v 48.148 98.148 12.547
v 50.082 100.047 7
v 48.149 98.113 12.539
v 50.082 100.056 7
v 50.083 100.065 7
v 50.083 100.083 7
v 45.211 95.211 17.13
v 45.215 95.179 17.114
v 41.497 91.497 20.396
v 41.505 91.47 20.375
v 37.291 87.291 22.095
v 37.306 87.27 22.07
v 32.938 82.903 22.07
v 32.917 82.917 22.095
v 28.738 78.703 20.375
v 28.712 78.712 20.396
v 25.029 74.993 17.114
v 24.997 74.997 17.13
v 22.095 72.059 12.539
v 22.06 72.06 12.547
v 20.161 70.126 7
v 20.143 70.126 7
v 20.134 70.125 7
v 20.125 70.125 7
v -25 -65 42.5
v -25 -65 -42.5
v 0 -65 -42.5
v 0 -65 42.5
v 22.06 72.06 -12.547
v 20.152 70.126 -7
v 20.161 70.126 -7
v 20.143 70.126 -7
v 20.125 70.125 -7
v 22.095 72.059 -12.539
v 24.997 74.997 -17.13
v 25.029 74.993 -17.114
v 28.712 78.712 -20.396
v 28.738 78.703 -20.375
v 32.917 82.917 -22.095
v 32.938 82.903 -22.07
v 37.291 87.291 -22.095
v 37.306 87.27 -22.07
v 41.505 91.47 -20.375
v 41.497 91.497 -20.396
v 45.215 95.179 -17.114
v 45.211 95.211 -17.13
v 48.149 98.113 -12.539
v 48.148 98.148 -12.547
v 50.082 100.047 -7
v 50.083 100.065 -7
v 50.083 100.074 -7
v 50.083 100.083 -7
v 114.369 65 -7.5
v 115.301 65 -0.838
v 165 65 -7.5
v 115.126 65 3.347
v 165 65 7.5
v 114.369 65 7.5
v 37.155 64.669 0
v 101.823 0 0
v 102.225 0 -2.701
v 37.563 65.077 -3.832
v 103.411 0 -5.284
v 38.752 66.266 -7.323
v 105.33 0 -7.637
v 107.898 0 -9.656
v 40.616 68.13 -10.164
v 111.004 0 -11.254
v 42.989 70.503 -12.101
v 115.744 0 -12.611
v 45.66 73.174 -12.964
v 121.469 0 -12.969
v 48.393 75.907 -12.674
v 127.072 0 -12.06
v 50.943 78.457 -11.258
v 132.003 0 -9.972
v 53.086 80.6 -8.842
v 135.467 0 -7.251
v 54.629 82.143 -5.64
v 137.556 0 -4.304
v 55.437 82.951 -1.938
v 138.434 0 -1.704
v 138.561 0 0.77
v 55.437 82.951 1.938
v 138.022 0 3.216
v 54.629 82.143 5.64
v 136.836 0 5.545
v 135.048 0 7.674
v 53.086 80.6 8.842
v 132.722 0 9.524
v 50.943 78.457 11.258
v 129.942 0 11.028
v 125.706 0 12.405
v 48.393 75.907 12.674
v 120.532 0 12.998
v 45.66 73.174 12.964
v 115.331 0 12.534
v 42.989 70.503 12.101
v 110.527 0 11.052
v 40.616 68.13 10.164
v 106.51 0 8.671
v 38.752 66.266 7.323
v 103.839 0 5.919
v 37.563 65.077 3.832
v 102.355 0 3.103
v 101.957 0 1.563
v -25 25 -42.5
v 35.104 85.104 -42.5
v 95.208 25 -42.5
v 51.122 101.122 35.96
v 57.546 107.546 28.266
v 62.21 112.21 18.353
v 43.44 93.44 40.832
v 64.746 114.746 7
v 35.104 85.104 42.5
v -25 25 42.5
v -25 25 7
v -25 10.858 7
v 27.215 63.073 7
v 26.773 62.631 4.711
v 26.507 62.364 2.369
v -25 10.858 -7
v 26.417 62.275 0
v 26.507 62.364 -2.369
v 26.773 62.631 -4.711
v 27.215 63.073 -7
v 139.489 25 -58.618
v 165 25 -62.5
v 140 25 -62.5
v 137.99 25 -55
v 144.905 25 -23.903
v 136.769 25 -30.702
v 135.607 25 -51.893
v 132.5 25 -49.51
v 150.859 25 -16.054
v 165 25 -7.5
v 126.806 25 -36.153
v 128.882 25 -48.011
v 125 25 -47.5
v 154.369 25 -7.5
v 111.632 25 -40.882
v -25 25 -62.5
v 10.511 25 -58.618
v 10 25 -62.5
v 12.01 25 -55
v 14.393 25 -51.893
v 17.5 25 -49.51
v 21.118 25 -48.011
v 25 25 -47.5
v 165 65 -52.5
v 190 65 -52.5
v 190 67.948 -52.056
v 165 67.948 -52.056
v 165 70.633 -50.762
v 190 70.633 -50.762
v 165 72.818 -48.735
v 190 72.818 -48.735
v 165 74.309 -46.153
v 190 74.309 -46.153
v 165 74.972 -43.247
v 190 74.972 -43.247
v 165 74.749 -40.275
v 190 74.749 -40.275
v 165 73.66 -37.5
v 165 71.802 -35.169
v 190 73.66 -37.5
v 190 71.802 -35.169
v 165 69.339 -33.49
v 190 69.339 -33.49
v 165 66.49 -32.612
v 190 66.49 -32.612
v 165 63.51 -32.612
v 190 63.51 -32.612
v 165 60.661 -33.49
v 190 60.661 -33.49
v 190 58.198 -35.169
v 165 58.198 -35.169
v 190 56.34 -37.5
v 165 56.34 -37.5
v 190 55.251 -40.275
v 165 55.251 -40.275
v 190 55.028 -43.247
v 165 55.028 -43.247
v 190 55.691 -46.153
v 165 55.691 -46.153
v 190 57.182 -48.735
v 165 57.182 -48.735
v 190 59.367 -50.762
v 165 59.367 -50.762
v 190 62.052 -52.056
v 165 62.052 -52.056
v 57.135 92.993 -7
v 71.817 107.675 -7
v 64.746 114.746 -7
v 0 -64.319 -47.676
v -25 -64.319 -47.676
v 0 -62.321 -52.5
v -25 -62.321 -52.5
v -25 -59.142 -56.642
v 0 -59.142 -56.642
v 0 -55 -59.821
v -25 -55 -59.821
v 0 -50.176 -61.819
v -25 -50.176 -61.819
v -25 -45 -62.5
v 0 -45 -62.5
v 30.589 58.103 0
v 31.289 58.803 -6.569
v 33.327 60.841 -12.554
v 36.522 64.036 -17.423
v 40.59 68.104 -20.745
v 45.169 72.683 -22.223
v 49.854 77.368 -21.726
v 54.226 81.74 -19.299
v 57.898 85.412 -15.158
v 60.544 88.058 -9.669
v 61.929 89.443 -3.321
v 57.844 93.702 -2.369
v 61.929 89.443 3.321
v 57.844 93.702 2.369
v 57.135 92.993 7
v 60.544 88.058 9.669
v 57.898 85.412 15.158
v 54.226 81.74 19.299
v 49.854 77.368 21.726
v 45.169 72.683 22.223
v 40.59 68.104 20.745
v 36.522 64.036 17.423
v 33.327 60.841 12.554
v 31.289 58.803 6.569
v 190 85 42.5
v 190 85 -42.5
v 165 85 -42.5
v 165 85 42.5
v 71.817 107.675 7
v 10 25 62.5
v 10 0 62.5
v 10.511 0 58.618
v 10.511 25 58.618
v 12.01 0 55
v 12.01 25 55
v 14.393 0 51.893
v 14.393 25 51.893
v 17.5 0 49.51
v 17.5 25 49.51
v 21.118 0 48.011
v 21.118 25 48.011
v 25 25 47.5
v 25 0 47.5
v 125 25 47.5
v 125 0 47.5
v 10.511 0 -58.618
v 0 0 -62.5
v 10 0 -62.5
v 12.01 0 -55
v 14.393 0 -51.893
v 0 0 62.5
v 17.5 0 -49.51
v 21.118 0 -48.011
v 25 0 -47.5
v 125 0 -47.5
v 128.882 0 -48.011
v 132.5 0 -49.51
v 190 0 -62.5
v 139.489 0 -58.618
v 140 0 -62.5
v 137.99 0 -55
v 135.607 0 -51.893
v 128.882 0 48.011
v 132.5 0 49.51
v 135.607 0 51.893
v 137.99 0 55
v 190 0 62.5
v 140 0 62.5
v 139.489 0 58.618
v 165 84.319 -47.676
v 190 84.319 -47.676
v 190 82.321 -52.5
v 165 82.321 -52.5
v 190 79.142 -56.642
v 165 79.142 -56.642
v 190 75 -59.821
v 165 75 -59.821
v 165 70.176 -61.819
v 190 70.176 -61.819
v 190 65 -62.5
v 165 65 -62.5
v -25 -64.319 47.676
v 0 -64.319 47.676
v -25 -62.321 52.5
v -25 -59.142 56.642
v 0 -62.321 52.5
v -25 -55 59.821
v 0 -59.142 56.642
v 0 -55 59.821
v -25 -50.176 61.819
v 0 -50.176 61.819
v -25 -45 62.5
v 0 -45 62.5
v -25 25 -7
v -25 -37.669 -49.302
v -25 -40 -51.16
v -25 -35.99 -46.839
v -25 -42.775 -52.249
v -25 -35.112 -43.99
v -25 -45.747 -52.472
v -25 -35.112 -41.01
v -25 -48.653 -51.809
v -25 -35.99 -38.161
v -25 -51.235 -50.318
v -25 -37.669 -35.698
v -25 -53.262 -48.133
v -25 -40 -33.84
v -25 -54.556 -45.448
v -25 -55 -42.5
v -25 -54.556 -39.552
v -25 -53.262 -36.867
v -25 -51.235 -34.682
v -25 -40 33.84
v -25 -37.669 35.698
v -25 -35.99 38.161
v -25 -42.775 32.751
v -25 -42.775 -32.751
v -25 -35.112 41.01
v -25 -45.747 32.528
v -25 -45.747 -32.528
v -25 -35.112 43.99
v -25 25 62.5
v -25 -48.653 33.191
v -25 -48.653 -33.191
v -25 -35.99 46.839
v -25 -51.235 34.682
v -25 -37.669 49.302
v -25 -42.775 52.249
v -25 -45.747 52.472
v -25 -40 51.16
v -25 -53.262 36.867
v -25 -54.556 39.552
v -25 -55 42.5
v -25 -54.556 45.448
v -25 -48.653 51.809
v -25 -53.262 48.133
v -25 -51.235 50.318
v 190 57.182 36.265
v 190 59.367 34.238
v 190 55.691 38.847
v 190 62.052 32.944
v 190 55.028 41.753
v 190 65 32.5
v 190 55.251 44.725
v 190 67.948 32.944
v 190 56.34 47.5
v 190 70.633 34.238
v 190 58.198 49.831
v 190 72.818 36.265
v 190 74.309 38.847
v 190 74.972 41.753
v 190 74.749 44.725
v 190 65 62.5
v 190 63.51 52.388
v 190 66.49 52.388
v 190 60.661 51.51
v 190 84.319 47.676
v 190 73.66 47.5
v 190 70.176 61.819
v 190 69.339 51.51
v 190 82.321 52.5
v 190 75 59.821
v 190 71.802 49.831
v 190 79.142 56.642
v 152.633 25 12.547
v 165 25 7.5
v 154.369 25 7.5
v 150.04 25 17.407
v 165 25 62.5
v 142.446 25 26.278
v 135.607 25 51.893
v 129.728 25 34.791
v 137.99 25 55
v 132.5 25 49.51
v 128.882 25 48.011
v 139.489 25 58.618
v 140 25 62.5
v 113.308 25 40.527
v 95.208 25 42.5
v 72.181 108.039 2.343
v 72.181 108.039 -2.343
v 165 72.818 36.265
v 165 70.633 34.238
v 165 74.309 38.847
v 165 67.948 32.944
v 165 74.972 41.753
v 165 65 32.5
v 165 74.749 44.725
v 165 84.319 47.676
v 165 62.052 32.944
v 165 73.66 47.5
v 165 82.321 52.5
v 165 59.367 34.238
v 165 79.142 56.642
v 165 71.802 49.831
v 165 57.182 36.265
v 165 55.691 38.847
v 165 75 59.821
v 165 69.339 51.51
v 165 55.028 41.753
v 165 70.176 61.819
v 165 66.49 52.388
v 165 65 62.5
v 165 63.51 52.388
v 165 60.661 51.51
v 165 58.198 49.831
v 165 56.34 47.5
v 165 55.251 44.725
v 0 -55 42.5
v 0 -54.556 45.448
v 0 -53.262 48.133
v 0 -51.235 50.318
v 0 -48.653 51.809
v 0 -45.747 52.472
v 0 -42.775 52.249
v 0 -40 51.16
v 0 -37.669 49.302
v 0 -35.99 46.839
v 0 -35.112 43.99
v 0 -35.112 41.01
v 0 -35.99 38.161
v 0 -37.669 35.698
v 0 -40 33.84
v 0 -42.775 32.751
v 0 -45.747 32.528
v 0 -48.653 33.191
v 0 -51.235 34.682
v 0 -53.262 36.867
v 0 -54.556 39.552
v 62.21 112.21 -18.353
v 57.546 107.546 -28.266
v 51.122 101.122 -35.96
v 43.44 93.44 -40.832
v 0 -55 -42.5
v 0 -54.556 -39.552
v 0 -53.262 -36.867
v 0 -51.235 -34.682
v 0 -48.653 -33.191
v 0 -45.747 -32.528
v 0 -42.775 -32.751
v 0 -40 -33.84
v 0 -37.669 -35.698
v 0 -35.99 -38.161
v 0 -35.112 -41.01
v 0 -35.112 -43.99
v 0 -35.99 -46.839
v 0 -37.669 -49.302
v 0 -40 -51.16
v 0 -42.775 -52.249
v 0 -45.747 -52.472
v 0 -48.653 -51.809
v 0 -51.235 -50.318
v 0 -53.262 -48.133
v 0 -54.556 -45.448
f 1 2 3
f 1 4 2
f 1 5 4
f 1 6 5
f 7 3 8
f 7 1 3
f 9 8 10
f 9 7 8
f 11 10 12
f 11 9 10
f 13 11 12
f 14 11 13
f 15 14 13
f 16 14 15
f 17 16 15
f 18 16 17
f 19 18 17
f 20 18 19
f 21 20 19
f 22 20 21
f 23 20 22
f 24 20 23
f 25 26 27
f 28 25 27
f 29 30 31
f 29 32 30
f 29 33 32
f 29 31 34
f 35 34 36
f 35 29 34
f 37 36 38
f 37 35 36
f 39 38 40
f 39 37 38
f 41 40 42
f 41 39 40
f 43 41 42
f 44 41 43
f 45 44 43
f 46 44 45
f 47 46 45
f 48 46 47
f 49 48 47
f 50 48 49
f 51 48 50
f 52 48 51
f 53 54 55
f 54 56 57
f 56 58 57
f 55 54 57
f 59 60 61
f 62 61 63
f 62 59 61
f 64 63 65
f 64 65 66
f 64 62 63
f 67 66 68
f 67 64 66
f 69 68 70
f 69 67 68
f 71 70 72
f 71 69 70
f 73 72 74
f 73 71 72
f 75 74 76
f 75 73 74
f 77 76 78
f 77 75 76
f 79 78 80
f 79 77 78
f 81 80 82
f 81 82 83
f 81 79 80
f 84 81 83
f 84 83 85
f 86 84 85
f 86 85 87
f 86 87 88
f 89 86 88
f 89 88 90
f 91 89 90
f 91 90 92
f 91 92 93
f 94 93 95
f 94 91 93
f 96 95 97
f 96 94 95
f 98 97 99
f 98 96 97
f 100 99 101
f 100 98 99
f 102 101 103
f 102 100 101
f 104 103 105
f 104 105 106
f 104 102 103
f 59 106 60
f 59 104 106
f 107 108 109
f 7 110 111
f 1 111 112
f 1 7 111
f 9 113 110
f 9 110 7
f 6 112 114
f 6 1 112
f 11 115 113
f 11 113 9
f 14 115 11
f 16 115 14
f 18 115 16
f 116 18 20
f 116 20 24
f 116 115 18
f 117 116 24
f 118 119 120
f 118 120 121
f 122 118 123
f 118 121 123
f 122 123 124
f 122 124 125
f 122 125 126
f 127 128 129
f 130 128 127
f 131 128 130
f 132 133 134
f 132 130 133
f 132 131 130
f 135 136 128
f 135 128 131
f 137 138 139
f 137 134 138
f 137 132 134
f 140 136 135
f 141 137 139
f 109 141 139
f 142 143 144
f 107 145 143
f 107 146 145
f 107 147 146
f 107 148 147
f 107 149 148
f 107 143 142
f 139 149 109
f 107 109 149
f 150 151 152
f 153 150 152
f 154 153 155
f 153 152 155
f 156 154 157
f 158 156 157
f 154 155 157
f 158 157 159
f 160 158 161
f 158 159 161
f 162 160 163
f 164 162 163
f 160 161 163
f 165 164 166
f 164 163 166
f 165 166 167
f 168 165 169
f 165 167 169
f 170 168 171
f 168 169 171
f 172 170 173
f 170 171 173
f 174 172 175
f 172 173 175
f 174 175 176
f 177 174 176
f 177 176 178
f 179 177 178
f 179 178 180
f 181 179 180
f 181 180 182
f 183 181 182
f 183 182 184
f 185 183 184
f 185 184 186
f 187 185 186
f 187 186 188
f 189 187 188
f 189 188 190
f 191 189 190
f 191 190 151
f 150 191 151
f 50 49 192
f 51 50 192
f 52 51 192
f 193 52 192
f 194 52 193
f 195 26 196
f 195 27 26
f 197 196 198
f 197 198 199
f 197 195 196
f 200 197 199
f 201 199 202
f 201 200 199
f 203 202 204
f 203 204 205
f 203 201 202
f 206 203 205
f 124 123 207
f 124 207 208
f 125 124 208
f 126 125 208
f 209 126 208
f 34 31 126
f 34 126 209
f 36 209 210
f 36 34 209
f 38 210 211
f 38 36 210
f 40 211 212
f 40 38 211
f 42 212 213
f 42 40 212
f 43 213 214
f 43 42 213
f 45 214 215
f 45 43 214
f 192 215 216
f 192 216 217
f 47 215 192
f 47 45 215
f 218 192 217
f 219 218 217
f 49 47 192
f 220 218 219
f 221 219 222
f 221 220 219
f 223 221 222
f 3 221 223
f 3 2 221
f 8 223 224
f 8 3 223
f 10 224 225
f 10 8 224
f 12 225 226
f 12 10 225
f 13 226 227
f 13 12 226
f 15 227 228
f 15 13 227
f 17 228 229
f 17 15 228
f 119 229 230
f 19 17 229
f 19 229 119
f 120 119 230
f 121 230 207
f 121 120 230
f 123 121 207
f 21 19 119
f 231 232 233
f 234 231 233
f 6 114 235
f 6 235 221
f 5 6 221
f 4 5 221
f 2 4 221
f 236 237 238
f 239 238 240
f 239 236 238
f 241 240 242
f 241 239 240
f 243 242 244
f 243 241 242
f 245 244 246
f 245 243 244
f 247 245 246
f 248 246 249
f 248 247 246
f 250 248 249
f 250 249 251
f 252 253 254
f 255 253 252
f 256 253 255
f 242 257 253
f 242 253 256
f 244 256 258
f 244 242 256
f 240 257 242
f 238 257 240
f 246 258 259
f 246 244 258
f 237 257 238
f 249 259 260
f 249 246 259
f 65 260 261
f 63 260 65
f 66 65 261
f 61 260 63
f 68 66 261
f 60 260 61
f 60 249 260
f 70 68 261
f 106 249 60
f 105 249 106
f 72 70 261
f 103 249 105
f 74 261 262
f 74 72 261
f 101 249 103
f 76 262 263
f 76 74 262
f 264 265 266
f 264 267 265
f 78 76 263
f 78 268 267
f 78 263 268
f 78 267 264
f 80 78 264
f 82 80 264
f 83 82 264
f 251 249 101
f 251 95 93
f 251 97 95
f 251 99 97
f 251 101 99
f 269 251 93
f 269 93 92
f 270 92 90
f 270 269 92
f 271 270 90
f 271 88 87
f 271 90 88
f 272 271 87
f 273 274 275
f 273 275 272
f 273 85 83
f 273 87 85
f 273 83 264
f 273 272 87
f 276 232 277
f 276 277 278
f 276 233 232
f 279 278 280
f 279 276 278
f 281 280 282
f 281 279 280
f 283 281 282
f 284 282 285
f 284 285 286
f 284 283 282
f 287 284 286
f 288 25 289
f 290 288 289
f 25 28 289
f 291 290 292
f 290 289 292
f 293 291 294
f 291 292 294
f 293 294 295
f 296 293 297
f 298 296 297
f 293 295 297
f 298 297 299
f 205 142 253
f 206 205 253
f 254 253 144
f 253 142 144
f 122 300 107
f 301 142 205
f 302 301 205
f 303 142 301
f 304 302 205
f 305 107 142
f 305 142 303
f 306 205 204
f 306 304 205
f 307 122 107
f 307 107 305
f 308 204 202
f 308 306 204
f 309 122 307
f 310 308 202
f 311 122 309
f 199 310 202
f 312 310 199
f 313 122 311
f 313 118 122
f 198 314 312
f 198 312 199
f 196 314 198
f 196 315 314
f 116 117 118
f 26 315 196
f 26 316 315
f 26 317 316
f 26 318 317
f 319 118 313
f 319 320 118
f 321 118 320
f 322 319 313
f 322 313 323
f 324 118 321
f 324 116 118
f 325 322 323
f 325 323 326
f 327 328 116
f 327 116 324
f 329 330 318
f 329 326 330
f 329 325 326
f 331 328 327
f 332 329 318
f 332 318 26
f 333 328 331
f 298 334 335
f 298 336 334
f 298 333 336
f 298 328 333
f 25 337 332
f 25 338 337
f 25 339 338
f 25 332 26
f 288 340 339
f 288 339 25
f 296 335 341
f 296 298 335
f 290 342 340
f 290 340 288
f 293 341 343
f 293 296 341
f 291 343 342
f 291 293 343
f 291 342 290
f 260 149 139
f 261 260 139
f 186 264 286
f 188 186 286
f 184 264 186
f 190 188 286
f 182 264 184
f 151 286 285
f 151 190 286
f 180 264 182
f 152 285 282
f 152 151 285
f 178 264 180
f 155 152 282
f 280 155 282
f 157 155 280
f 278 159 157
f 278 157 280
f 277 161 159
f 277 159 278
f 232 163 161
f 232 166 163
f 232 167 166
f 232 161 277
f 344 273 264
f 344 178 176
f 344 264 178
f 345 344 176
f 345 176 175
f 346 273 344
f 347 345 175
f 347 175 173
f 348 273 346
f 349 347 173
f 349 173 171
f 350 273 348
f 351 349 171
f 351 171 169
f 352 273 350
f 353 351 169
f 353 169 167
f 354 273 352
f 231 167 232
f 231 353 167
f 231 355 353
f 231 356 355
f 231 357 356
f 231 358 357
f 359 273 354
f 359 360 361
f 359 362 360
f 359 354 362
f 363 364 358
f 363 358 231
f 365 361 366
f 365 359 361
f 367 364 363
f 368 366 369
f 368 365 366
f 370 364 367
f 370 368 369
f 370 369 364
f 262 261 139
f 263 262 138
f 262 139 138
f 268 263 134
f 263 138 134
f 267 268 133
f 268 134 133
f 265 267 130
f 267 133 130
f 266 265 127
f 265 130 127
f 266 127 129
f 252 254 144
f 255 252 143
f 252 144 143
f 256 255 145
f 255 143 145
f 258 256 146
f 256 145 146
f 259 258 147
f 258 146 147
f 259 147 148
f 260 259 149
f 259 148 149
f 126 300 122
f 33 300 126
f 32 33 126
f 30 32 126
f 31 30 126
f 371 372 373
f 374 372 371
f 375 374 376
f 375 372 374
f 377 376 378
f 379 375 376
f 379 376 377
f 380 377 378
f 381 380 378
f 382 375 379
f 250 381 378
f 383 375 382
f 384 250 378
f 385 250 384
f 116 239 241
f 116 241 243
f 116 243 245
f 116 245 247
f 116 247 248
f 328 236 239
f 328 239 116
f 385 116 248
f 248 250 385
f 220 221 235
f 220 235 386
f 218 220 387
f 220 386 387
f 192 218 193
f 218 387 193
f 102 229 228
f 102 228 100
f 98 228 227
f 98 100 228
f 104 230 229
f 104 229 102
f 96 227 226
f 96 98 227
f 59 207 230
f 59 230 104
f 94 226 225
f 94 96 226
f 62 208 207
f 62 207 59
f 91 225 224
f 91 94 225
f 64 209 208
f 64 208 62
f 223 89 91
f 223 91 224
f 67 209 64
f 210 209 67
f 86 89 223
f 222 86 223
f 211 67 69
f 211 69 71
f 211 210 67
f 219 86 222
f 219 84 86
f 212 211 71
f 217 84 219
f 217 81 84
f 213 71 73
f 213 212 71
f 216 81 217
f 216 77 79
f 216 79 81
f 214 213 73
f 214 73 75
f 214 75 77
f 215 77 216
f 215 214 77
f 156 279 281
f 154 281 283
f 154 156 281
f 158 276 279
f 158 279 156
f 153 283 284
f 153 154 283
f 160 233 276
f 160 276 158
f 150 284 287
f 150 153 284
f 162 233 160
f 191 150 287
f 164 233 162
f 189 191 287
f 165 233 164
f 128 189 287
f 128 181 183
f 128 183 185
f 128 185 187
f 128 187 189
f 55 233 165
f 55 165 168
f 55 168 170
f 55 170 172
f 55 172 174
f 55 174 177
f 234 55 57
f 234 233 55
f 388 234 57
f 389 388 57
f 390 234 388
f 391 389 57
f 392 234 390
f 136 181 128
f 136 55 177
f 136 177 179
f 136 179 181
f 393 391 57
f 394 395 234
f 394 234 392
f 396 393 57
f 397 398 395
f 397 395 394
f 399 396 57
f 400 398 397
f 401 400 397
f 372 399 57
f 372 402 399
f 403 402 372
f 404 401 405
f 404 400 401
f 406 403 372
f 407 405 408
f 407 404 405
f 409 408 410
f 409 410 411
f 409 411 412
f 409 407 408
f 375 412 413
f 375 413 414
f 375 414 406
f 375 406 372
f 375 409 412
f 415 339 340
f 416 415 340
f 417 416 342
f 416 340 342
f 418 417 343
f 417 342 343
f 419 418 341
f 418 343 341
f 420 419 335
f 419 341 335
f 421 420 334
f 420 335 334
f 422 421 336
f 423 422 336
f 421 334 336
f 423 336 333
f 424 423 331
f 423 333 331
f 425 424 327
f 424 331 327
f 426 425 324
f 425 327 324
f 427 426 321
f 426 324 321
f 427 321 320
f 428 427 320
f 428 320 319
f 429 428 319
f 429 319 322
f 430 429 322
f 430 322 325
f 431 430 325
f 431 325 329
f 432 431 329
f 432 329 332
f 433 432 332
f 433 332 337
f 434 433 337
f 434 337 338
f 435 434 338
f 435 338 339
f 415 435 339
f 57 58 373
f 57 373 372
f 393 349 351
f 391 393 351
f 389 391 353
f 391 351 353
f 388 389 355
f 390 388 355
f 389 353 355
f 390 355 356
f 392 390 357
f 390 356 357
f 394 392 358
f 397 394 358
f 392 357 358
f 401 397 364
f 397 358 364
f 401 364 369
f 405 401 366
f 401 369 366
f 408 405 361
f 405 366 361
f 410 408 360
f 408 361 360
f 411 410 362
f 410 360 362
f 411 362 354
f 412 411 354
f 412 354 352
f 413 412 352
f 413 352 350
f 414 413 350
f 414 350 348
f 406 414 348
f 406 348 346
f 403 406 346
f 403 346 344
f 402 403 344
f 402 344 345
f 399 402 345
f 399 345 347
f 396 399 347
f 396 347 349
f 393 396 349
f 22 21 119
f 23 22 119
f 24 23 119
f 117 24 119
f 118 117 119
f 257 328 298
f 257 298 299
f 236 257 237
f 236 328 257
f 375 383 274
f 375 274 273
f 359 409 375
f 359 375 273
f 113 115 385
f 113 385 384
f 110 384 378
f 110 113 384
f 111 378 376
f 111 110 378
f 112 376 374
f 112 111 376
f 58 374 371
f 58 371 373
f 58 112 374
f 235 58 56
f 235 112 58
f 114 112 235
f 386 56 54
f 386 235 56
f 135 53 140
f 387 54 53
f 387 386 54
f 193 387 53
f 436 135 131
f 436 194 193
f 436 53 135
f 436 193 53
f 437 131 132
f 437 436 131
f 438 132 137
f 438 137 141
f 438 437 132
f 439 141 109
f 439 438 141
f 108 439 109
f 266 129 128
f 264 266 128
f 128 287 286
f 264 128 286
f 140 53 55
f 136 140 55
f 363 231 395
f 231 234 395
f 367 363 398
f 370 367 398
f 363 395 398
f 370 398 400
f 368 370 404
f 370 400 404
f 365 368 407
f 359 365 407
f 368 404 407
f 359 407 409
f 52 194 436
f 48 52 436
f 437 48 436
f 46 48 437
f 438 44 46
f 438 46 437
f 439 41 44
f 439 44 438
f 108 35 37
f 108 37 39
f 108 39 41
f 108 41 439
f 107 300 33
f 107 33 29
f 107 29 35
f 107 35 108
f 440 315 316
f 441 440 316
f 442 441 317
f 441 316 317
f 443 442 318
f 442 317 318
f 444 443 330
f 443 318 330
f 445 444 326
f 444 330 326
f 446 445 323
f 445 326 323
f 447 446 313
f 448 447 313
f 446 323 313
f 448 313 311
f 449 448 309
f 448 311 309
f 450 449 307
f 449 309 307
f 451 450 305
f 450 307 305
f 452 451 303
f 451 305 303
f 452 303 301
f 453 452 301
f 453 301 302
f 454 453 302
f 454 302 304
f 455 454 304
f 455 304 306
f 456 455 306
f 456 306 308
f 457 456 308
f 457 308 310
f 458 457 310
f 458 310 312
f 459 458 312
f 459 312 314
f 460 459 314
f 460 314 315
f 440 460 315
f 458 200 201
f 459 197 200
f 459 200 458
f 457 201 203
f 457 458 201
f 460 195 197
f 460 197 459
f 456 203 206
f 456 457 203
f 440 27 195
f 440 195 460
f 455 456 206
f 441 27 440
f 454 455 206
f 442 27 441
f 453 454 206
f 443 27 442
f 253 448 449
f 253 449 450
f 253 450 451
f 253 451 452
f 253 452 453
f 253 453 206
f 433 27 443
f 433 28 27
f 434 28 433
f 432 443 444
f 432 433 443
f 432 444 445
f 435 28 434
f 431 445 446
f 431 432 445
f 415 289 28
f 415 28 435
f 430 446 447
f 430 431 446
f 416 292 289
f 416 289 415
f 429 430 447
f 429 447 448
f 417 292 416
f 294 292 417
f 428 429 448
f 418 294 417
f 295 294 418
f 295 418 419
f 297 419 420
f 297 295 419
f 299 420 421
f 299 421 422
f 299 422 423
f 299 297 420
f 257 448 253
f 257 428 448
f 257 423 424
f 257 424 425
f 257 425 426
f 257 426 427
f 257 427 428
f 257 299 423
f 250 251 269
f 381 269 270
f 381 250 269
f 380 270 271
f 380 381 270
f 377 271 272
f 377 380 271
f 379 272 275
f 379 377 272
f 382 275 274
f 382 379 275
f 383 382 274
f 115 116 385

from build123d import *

# Parameters (mm, degrees)
BOSS_EXTRUDE1_DEPTH = 62.5
FILLET1_R           = 20
SKETCH2_R           = 10
CUT_EXTRUDE1_DEPTH  = 240.491649124
SKETCH3_R           = 10
CUT_EXTRUDE2_DEPTH  = 125
SKETCH4_W           = 148.086919985
SKETCH4_H           = 40
BOSS_EXTRUDE2_DEPTH = 7.5
BOSS_EXTRUDE3_REACH = 243.312
CUT_EXTRUDE3_REACH  = 221.395
CUT_EXTRUDE4_DEPTH  = 10


with BuildPart() as part:
    # Sketch1 → Boss-Extrude1 (new, symmetric)
    with BuildSketch(Plane.XY):
        Polygon((0, 0), (190, 0), (190, 85), (165, 85), (165, 25), (-25, 25), (-25, -65), (0, -65), align=None)
    extrude(amount=BOSS_EXTRUDE1_DEPTH, both=True)

    # Fillet1
    fillet1_edges = [part.edges().sort_by_distance(p)[0] for p in [
        (177.5, 85, -62.5),
        (177.5, 85, 62.5),
        (-12.5, -65, 62.5),
        (-12.5, -65, -62.5),
    ]]
    fillet(fillet1_edges, radius=FILLET1_R)

    # Sketch2 → Cut-Extrude1 (cut, through all)
    with BuildSketch(Plane(origin=(190, 0, 0), x_dir=(0, 0, -1), z_dir=(1, 0, 0))):
        with Locations((42.5, 65)):
            Circle(SKETCH2_R)
        with Locations((-42.5, 65)):
            Circle(SKETCH2_R)
    extrude(amount=-CUT_EXTRUDE1_DEPTH, mode=Mode.SUBTRACT)

    # Sketch3 → Cut-Extrude2 (cut)
    with BuildSketch(Plane.ZY.offset(25)):
        with Locations(Location((42.5, -45, 0), (0, 0, 270))):
            Circle(SKETCH3_R)
        with Locations(Location((-42.5, -45, 0), (0, 0, 270))):
            Circle(SKETCH3_R)
    extrude(amount=-CUT_EXTRUDE2_DEPTH, mode=Mode.SUBTRACT)

    # Sketch4 → Boss-Extrude2 (add, symmetric)
    with BuildSketch(Plane.XY):
        with Locations((90.956540007, 45)):
            Rectangle(SKETCH4_W, SKETCH4_H)
    extrude(amount=BOSS_EXTRUDE2_DEPTH, both=True)

    # Sketch5 → Boss-Extrude3 (add, up to next)
    with BuildSketch(Plane(origin=(-25, 25, 0), x_dir=(0, 0, -1), z_dir=(-0.707106781186549, 0.7071067811865461, 0)), mode=Mode.PRIVATE) as boss_extrude3_sk1:
        with BuildLine():
            Line((-42.5, 0), (-42.5, -85))
            ThreePointArc((-42.5, -85), (0, -127.5), (42.5, -85))
            Line((42.5, -85), (42.5, 0))
            Line((42.5, 0), (-42.5, 0))
        make_face()
    boss_extrude3_tool1 = extrude(boss_extrude3_sk1.sketch, amount=-BOSS_EXTRUDE3_REACH, mode=Mode.PRIVATE) - part.part
    add(boss_extrude3_tool1.solids().sort_by_distance((17.122184, 67.122184, 0))[0])

    # Sketch7 → Cut-Extrude3 (cut, up to next)
    with BuildSketch(Plane(origin=(0, 25, 0), x_dir=(1, 0, 0), z_dir=(0, 1, 0)), mode=Mode.PRIVATE) as cut_extrude3_sk1:
        with BuildLine():
            Line((25, -47.5), (125, -47.5))
            ThreePointArc((125, -47.5), (135.606601718, -51.893398282), (140, -62.5))
            Line((140, -62.5), (10, -62.5))
            ThreePointArc((10, -62.5), (14.393398282, -51.893398282), (25, -47.5))
        make_face()
    cut_extrude3_tool1 = extrude(cut_extrude3_sk1.sketch, amount=-CUT_EXTRUDE3_REACH, mode=Mode.PRIVATE) & part.part
    cut_extrude3 = cut_extrude3_tool1.solids().sort_by_distance((75, 25, 55.216204))[0]
    add(cut_extrude3, mode=Mode.SUBTRACT)

    # Mirror1: Cut-Extrude3 across plane
    add(cut_extrude3.mirror(Plane.XY), mode=Mode.SUBTRACT)

    # Sketch8 → Cut-Extrude4 (cut)
    with BuildSketch(Plane(origin=(-25, 25, 0), x_dir=(0, 0, 1), z_dir=(-0.7071067811865489, 0.7071067811865462, 0))):
        with BuildLine():
            Line((-7, -26.74015117), (-7, 126.919565837))
            ThreePointArc((-7, 126.919565837), (0, 127.5), (7, 126.919565837))
            Line((7, 126.919565837), (7, -26.74015117))
            Line((7, -26.74015117), (-7, -26.74015117))
        make_face()
    extrude(amount=-CUT_EXTRUDE4_DEPTH, mode=Mode.SUBTRACT)

    # Sketch13 → CBORE for M24 Hex Head Bolt2 (revolve, cut)
    with BuildSketch(Plane(origin=(35.104076401, 85.104076401, 0), x_dir=(-0.7071067811865462, -0.7071067811865489, 0), z_dir=(0, 0, 1))):
        Polygon((0, 0), (0, 215.667568262), (13, 215.667568262), (13, 15.9), (22.285, 15.9), (22.285, 0.025), (22.31, 0), align=None)
    revolve(axis=Axis((30.61394834, 89.594204461, 0), (0.7071067811865489, -0.7071067811865462, 0)), mode=Mode.SUBTRACT)


solid = part.part
